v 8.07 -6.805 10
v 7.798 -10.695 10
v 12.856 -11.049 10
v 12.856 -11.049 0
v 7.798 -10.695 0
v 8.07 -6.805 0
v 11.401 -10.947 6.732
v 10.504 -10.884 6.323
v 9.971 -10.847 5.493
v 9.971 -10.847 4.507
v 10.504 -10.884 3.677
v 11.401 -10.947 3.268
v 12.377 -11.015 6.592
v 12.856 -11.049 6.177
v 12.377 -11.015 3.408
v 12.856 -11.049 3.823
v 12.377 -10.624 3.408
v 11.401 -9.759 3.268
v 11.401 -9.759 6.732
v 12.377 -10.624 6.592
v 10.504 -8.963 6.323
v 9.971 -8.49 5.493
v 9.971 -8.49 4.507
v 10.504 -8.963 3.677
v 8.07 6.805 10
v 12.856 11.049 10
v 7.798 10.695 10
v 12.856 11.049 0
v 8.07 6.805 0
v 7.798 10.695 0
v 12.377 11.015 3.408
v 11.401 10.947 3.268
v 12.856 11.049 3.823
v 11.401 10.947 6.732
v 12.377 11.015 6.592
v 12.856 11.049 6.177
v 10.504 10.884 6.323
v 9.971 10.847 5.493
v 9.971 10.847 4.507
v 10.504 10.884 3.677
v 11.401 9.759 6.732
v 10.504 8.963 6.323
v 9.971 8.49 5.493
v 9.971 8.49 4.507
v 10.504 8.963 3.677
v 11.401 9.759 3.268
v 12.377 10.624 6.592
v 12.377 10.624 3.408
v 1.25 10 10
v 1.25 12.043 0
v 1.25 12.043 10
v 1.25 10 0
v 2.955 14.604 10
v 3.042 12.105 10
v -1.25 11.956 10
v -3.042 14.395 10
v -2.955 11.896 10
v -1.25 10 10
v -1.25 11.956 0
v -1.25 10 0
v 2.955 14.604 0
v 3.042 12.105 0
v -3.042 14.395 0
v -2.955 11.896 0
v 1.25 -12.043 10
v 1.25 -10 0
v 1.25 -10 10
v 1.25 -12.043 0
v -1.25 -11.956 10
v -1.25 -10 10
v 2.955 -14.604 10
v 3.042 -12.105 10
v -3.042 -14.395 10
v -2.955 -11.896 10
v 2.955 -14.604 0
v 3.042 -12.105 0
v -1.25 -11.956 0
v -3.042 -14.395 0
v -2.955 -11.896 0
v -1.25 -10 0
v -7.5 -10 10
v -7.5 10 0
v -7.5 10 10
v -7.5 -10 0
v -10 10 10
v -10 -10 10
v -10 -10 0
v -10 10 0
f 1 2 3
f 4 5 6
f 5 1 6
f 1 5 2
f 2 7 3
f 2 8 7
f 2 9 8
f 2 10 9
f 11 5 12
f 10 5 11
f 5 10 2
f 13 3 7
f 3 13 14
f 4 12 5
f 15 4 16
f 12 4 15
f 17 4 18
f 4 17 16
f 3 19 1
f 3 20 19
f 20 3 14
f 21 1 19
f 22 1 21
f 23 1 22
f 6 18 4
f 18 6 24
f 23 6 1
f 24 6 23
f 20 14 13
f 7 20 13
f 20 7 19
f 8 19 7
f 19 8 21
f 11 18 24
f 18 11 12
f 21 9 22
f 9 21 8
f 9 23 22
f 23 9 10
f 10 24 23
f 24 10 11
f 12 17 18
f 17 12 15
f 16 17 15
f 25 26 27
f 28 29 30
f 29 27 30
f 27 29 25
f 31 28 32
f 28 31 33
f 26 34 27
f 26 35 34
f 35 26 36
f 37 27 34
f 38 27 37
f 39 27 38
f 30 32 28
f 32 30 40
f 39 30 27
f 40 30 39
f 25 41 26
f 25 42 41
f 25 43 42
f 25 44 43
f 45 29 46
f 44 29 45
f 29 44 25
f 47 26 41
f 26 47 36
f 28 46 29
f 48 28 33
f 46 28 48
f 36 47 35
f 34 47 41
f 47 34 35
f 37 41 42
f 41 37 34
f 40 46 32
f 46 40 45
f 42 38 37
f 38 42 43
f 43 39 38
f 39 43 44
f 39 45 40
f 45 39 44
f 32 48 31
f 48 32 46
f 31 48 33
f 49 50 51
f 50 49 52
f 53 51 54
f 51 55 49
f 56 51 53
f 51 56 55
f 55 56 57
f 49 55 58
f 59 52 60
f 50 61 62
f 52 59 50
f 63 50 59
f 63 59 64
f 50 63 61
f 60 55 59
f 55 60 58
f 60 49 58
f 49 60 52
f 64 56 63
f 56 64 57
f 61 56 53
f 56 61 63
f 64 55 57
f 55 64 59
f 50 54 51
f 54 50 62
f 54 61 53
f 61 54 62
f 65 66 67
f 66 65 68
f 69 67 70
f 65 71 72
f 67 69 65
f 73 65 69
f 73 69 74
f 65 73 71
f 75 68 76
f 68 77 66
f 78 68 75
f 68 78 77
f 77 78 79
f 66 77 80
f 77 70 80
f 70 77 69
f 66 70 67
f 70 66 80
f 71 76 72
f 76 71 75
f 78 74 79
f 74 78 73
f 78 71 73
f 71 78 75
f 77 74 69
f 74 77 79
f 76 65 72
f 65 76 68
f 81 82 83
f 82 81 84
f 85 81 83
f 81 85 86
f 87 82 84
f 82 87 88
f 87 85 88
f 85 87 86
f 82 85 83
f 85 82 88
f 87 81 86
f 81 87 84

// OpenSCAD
// file: sweep.scad
// sweep.scad
//
// This code is copied from
// https://github.com/openscad/list-comprehension-demos
// and
// https://github.com/openscad/scad-utils
// to make hangprinter repo self-contained
// It was included in order to make the worm drive parametric
// In future OpenSCAD (or other script CAD programs)
// worm drives should be will be more easily constructed without
// this user space defined sweep operation.
// See OpenSCAD discussion at:
// https://github.com/openscad/openscad/issues/114

// Look into files
// lists.scad
// X transformations.scad
// linalg.scad
// se3.scad
// so3.scad


// Include modules and fcts:

/// linalg.scad
function vec3(p) = len(p) < 3 ? concat(p,0) : p;
function vec4(p) = let (v3=vec3(p)) len(v3) < 4 ? concat(v3,1) : v3;
function take3(v) = [v[0],v[1],v[2]];
function tail3(v) = [v[3],v[4],v[5]];
function construct_Rt(R,t) = [concat(R[0],t[0]),concat(R[1],t[1]),concat(R[2],t[2]),[0,0,0,1]];

/// so3.scad

function se3_exp_2(t,w) = se3_exp_2_0(t,w,w*w);
function se3_exp_2_0(t,w,theta_sq) =
se3_exp_23(
	so3_exp_2(theta_sq),
	C = (1.0 - theta_sq/20) / 6,
	t=t,w=w);

// Taylor series expansions close to 0
function so3_exp_1(theta_sq) = [
	1 - 1/6*theta_sq,
	0.5
];

function rodrigues_so3_exp(w, A, B) = [
  [1.0 - B*(w[1]*w[1] + w[2]*w[2]), B*(w[0]*w[1]) - A*w[2],          B*(w[0]*w[2]) + A*w[1]],
  [B*(w[0]*w[1]) + A*w[2],          1.0 - B*(w[0]*w[0] + w[2]*w[2]), B*(w[1]*w[2]) - A*w[0]],
  [B*(w[0]*w[2]) - A*w[1],          B*(w[1]*w[2]) + A*w[0],          1.0 - B*(w[0]*w[0] + w[1]*w[1])]
];

function so3_exp_3_0(theta_deg, inv_theta) = [
	sin(theta_deg) * inv_theta,
	(1 - cos(theta_deg)) * (inv_theta * inv_theta)
];

/// se3.scad
function combine_se3_exp(w, ABt) = construct_Rt(rodrigues_so3_exp(w, ABt[0], ABt[1]), ABt[2]);
function se3_exp_1(t,w) = concat(
	so3_exp_1(w*w),
	[t + 0.5 * cross(w,t)]
);

function se3_exp_3(t,w) = se3_exp_3_0(t,w,sqrt(w*w)*180/PI,1/sqrt(w*w));

function se3_exp_23(AB,C,t,w) =
[AB[0], AB[1], t + AB[1] * cross(w,t) + C * cross(w,cross(w,t)) ];

function se3_exp_3_0(t,w,theta_deg,inv_theta) =
se3_exp_23(
	so3_exp_3_0(theta_deg = theta_deg, inv_theta = inv_theta),
	C = (1 - sin(theta_deg) * inv_theta) * (inv_theta * inv_theta),
t=t,w=w);

function se3_exp(mu) = se3_exp_0(t=take3(mu),w=tail3(mu)/180*PI);

function se3_exp_0(t,w) =
combine_se3_exp(w,
// Evaluate by Taylor expansion when near 0
	w*w < 1e-8
	? se3_exp_1(t,w)
	: w*w < 1e-6
	  ? se3_exp_2(t,w)
	  : se3_exp_3(t,w)
);


/// lists.scad
/*!
  Flattens a list one level:

  flatten([[0,1],[2,3]]) => [0,1,2,3]
*/
function flatten(list) = [ for (i = list, v = i) v ];
/*!
  Extracts a subarray from index begin (inclusive) to end (exclusive)

  subarray([1,2,3,4], 1, 2) => [2,3]
*/
function subarray(list,begin=0,end=-1) = [
    let(end = end < 0 ? len(list) : end)
      for (i = [begin : 1 : end-1])
        list[i]
];

/// transformations.scad
//********* Create modifying matrices ***************//
/*!
  Creates a rotation matrix

  xyz = euler angles = rz * ry * rx
  axis = rotation_axis * rotation_angle
*/
function rotation(xyz=undef, axis=undef) =
	xyz != undef && axis != undef ? undef :
	xyz == undef  ? se3_exp([0,0,0,axis[0],axis[1],axis[2]]) :
	len(xyz) == undef ? rotation(axis=[0,0,xyz]) :
	(len(xyz) >= 3 ? rotation(axis=[0,0,xyz[2]]) : identity4()) *
	(len(xyz) >= 2 ? rotation(axis=[0,xyz[1],0]) : identity4()) *
(len(xyz) >= 1 ? rotation(axis=[xyz[0],0,0]) : identity4());

/*!
  Creates a scaling matrix
*/
function scaling(v) = [
	[v[0],0,0,0],
	[0,v[1],0,0],
	[0,0,v[2],0],
	[0,0,0,1],
];

/*!
  Creates a translation matrix
*/
function translation(v) = [
	[1,0,0,v[0]],
	[0,1,0,v[1]],
	[0,0,1,v[2]],
	[0,0,0,1],
];


function project(x) = subarray(x,end=len(x)-1) / x[len(x)-1];

function transform(m, list) = [for (p=list) project(m * vec4(p))];

function to_3d(list) = [ for(v = list) vec3(v) ];

module sweep(shape, path_transforms, closed=false) {

    pathlen = len(path_transforms);
    segments = pathlen + (closed ? 0 : -1);
    shape3d = to_3d(shape);

    function sweep_points() =
      flatten([for (i=[0:pathlen-1])
        transform(path_transforms[i], shape3d)]);

    function loop_faces() = [let (facets=len(shape3d))
        for(s=[0:segments-1], i=[0:facets-1])
          [(s%pathlen) * facets + i,
           (s%pathlen) * facets + (i + 1) % facets,
           ((s + 1) % pathlen) * facets + (i + 1) % facets,
           ((s + 1) % pathlen) * facets + i]];

    bottom_cap = closed ? [] : [[for (i=[len(shape3d)-1:-1:0]) i]];
    top_cap = closed ? [] : [
      [for (i=[0:len(shape3d)-1])
        i+len(shape3d)*(pathlen-1)]];
    polyhedron(points = sweep_points(),
               faces  = concat(loop_faces(),
                               bottom_cap,
                               top_cap),
               convexity=5);
}
// file: util.scad
include <parameters.scad>

//!rounded_cube([40,61,42], 8, center=true);
module rounded_cube(v, r, center=false){
  fn = 32;
  v = (v[0] == undef) ? [v, v, v] : v;
  obj_translate = center ?
    [-(v[0] / 2), -(v[1] / 2),	-(v[2] / 2)] : [0, 0, 0];
  d = 2*r;

  //!frame();
  module frame(){
    xy_corners = [[0, 0, 0], [v[0]-d, 0, 0], [v[0]-d, v[1]-d, 0], [0, v[1]-d, 0]];
    translate([r,r,r])
    for(i=[0:3]){
      l = i%2 == 0 ? v[0] - d : v[1] - d;
      translate(xy_corners[i]){
        rotate([0,0,90*i]){
          cylinder(r=r, h=v[2]-d, $fn = fn);
          for(j=[0,v[2]-d]){
            translate([0,0,j]){
              sphere(r, $fn = fn);
              rotate([0,90,0])
                rotate([0,0,0.5*360/fn])
                cylinder(r=r, h=l, $fn = fn);
            }
          }
        }
      }
    }
  }

  //!core();
  module core(){
    translate([r, r, 0]){
      cube([v[0] - d, v[1] - d, v[2]]);
    }
    translate([r, 0, r]){
      cube([v[0] - d, v[1], v[2] - d]);
    }
    translate([0, r, r]){
      cube([v[0], v[1] - d, v[2] - d]);
    }
  }

  translate(obj_translate){
    union(){
      core();
      frame();
    }
  }
}

//rounded_cube2([20,30,2], 2);
module rounded_cube2(v, r){
  $fs = 1;
  union(){
    translate([r,0,0])           cube([v[0]-2*r, v[1]    , v[2]]);
    translate([0,r,0])           cube([v[0]    , v[1]-2*r, v[2]]);
    translate([r,r,0])           cylinder(h=v[2], r=r);
    translate([v[0]-r,r,0])      cylinder(h=v[2], r=r);
    translate([v[0]-r,v[1]-r,0]) cylinder(h=v[2], r=r);
    translate([r,v[1]-r,0])      cylinder(h=v[2], r=r);
  }
}

module rounded_square(v, r){
  union(){
    translate([r,0])           square([v[0]-2*r, v[1]]);
    translate([0,r])           square([v[0], v[1]-2*r]);
    translate([r,r])           circle(r);
    translate([v[0]-r,r])      circle(r);
    translate([v[0]-r,v[1]-r]) circle(r);
    translate([r,v[1]-r])      circle(r);
  }
}


module beam(l, standing = false){
  v = standing ? [Beam_width, Beam_width, l] : [l, Beam_width, Beam_width];
  cube(v);
}

module fat_beam(l, standing = false){
  v = standing ? [Fat_beam_width, Fat_beam_width, l] : [l, Fat_beam_width, Fat_beam_width];
  cube(v);
}

//standing_ls_tri(10, 20);
module standing_ls_tri(l, h){
  difference(){
  cube([l,l,h]);
  translate([l,0,0])
    rotate([0,0,45])
    translate([0,0,-1])
    cube([l*sqrt(2),l*sqrt(2),h+2]);
  }
}

// Functions for use with sweep
function my_square(v) = [[-v[0]/2, -v[1]/2],
                         [ v[0]/2, -v[1]/2],
                         [ v[0]/2,  v[1]/2],
                         [-v[0]/2,  v[1]/2]];

function my_rounded_square(v, r, step=7.5) = [
  for (i=[0:step:360])
    i < 90 ?
    [r,r] - r*[cos(i), sin(i)] :
    i < 180 ?
    [v[0]-r,r] - r*[cos(i), sin(i)] :
    i < 270 ?
    [v[0]-r,v[1]-r] - r*[cos(i), sin(i)] :
    [r,v[1]-r] - r*[cos(i), sin(i)]];

function my_rounded_eqtri(l, r, step=3) = [
  for (i=[-30:step:360-30.01])
    (i < 120 - 30) ?
    [r*sqrt(3),r] - r*[cos(i), sin(i)] :
    (i < 240 - 30) ?
    [l-r*sqrt(3),r] - r*[cos(i), sin(i)] :
    [l/2,sqrt(3)*l/2-r*2] - r*[cos(i), sin(i)]];

module rounded_2corner(v, r){
  v = (v[0] == undef) ? [v, v] : v;
  square([v[0]-r,v[1]]);
  translate([0,r])
    square([v[0],v[1]-2*r]);
  translate([v[0]-r, r])
    circle(r=r,$fs = 1);
  translate([v[0]-r, v[1]-r])
    circle(r=r,$fs = 1);
}

module Nema17_screw_translate(corners){
  for (i=[0:90:90*corners - 1]){
    rotate([0,0,i+45]) translate([Nema17_screw_hole_width/2,0,0]) children();
  }
}

module Nema17_screw_holes(d, h, corners=4){
  Nema17_screw_translate(corners) cylinder(r=d/2,h=h);
}

module centered_u_groove_bearing(){
  translate([1.5,-32,0])
    import("U-groove_bearing.stl");
}

// Looks best with $fn = n*8
module round_end(v){
  v = (v[0] == undef) ? [v, v] : v;
  cube([v[0]-v[1]/2, v[1], v[2]]);
  translate([v[0]-v[1]/2, v[1]/2,0])
    cylinder(d=v[1], h=v[2]);
}
// file: parameters.scad
// Parameters shared between modules
Base_th = 2.8;
Beam_width = 15;
Wiggle = 0.25;
Fat_beam_width = Beam_width + Wiggle;
Beam_length = 400;
Wall_th = 2.5;
Min_beam_width = 12.5;
Max_beam_width = 17.5;
Zip_th = 2;
Zip_h = Zip_th + Max_beam_width - Min_beam_width;
Zip_w = 5.0;
Nema17_cube_width          = 42.43;
Nema17_screw_hole_width    = 43.74; // Opposite corner screws
Nema17_ring_diameter       = 22;
Nema17_cube_height         = 39.36;
Nema17_shaft_height        = 63.65;
Nema17_ring_height         = 2;
Nema17_shaft_radius        = 5/2;
b608_outer_dia = 22.2;
b608_width = 7.05;
Gap_between_sandwich_and_plate = 1.5 + Base_th; // 1.5 mm for wiggle
Motor_bracket_flerp_r = 6;
Motor_bracket_flerp = 14;
Motor_bracket_cw = Nema17_cube_width + 6;
Motor_bracket_att_ang = 50;
Mounting_screw_d = 4.5;
Mounting_screw_head_d = 14;
Spool_outer_wall_th = 4;

// Corner clamp parameters
Cc_l1 = (Fat_beam_width+2*Wall_th)*2*sqrt(3);
Cc_rad_b = 4;
Cc_action_point_from_mid = Cc_l1/sqrt(3)-2*Cc_rad_b-1.3;  // 1.3 chosen arbitrarily
Cc_plastic_length = sqrt(Cc_action_point_from_mid*Cc_action_point_from_mid
                       - (Cc_action_point_from_mid/2)*(Cc_action_point_from_mid/2));

// The distance between the two action points on the mover
Sidelength = Beam_length + 2*Cc_plastic_length;

/////// Layout parameters ////////////
Ext_sidelength = Sidelength+77;
Additional_added_plate_side_length = 10;
Yshift_top_plate = -25;

/////// Gear parameters ////////////
Circular_pitch = 262;
Motor_teeth = 10;
Gear_height = 21.4-3;
Motor_pitch                      = (Motor_teeth*Circular_pitch/360);
Motor_pitch_diametrial           = Motor_teeth/(2*Motor_pitch);
Motor_outer_radius               = Motor_pitch + 1/Motor_pitch_diametrial;
Spool_teeth = 100;
Spool_r = 55;
Spool_height = 8;
Spool_pitch                      = (Spool_teeth*Circular_pitch/360);
Spool_pitch_diametrial           = Spool_teeth/(2*Spool_pitch);
Spool_outer_radius               = Spool_pitch + 1/Spool_pitch_diametrial;
Torx_depth = 5;
Motor_bracket_depth = Gear_height+1+7+Nema17_ring_height+1+Gap_between_sandwich_and_plate;
Spool_core_flerp0 = 16+3;

/////// Lineroller parameters ////////////
b623_width  = 4;
b623_bore_r = 3/2;
b623_vgroove_big_r = 12/2;
b623_vgroove_small_r = 10/2;
Lineroller_wall_th = 2.3;


// The height that lineroller_ABC_winch will have if we include the bearing
Tower_h = Gap_between_sandwich_and_plate+Gear_height
         + Spool_height/2
         + b623_vgroove_small_r
         + b623_vgroove_big_r;
Bearing_wall = 1;
Depth_of_lineroller_tower = b623_width + 2*Wall_th; // 9
Depth_of_lineroller_base = Depth_of_lineroller_tower + 9; // 18
Ptfe_r = 2.1;
Lineroller_base_r = Depth_of_lineroller_base/2-1*(Ptfe_r+2);
Screw_h = 2;
Screw_head_h = 2;
Spool_center_bearing_wall_th = 5;
Idler_block_bearing_center_to_center = 15;

//// Lineroller anchor parameters /////

Bearing_0_x = 2*b623_vgroove_big_r+Bearing_wall+5.3;
Bearing_1_x = b623_vgroove_small_r-0.9;
Move_tower = -12.2;
Lower_bearing_z = 13;
Higher_bearing_z = Lower_bearing_z + Idler_block_bearing_center_to_center;
// main file
include <parameters.scad>
use <util.scad>
use <sweep.scad>

//%prev_art();
module prev_art(){
  //translate([0,15+2*2.5,0])
    rotate([0,0,-90])
    import("../stl/linetensioner.stl");
}

//beam_slider();
module beam_slider(){
  wall_th = Wall_th;
  h = 10;
  extra_length = 6;
  w = Beam_width+2*wall_th;
  difference(){
    translate([-Beam_width/2 - wall_th, -Beam_width/2 - wall_th, 0])
      cube([w+extra_length, w, h]);
    translate([-Fat_beam_width/2, -Fat_beam_width/2, -1])
      cube([Fat_beam_width+extra_length+wall_th+1, Fat_beam_width, h+2]);
    translate([Beam_width/2+3.5/2+2, 0, h/2])
      rotate([90,0,0])
      cylinder(d=3.5, h=w+2, center=true, $fs=1);
  }
}

// Bends arms outwards, so pressure is distributed over beam flat-sides
beam_slider2();
module beam_slider2(){
  wall_th = Wall_th;
  h = 10;
  extra_length = 6;
  w = Beam_width+2*wall_th;

  module arm(){
    function my_sq(v) =
      [[0,0], [v[0],0], [v[0], v[1]], [0, v[1]]];
    difference(){
      union(){
        sweep(my_sq([h, wall_th]),
          [for(i=[0.2:0.3:w+extra_length])
            translation([w/2+extra_length-i,
            // Bend arm outwards, following a log graph
            -w/2 - 1.5*(log(1+w+extra_length) - log(1+i)), 0])
            * rotation([0, -90, 0])
            // Round off tip of arm...
            * translation([0,2*wall_th/3,0])
            * scaling([1, (i < 3) ? log(1 + 9*i/3) : 1, 1])
            * translation([0,-2*wall_th/3,0])]);
        rotate([0,0,-4])
          translate([Fat_beam_width/2+0.9,-Fat_beam_width/2-wall_th,0])
          scale([1.3,1,1])
          standing_ls_tri(wall_th+1.4, h);
      }
      translate([Beam_width/2+3.5/2+2.4, 0, h/2])
        rotate([90,0,0])
        cylinder(d=3.5, h=w+10, center=true, $fs=1);
    }
  }
  arm();
  mirror([0,1,0])
    arm();
  translate([-wall_th-Beam_width/2,-w/2,0])
    cube([wall_th, w, h]);
  // Hooks for line
  hook_h = 6;

  for(k=[0,1])
    mirror([0,k,0]){
      translate([-2.5/2,w/2,0])
        cube([2.5, 2.5, h]);
      translate([0,2+w/2+2.5/2,0])
        rotate([0,0,2])
        translate([-hook_h/2,-2.5/2,0])
        cube([hook_h, 2.5, h]);
    }
}
